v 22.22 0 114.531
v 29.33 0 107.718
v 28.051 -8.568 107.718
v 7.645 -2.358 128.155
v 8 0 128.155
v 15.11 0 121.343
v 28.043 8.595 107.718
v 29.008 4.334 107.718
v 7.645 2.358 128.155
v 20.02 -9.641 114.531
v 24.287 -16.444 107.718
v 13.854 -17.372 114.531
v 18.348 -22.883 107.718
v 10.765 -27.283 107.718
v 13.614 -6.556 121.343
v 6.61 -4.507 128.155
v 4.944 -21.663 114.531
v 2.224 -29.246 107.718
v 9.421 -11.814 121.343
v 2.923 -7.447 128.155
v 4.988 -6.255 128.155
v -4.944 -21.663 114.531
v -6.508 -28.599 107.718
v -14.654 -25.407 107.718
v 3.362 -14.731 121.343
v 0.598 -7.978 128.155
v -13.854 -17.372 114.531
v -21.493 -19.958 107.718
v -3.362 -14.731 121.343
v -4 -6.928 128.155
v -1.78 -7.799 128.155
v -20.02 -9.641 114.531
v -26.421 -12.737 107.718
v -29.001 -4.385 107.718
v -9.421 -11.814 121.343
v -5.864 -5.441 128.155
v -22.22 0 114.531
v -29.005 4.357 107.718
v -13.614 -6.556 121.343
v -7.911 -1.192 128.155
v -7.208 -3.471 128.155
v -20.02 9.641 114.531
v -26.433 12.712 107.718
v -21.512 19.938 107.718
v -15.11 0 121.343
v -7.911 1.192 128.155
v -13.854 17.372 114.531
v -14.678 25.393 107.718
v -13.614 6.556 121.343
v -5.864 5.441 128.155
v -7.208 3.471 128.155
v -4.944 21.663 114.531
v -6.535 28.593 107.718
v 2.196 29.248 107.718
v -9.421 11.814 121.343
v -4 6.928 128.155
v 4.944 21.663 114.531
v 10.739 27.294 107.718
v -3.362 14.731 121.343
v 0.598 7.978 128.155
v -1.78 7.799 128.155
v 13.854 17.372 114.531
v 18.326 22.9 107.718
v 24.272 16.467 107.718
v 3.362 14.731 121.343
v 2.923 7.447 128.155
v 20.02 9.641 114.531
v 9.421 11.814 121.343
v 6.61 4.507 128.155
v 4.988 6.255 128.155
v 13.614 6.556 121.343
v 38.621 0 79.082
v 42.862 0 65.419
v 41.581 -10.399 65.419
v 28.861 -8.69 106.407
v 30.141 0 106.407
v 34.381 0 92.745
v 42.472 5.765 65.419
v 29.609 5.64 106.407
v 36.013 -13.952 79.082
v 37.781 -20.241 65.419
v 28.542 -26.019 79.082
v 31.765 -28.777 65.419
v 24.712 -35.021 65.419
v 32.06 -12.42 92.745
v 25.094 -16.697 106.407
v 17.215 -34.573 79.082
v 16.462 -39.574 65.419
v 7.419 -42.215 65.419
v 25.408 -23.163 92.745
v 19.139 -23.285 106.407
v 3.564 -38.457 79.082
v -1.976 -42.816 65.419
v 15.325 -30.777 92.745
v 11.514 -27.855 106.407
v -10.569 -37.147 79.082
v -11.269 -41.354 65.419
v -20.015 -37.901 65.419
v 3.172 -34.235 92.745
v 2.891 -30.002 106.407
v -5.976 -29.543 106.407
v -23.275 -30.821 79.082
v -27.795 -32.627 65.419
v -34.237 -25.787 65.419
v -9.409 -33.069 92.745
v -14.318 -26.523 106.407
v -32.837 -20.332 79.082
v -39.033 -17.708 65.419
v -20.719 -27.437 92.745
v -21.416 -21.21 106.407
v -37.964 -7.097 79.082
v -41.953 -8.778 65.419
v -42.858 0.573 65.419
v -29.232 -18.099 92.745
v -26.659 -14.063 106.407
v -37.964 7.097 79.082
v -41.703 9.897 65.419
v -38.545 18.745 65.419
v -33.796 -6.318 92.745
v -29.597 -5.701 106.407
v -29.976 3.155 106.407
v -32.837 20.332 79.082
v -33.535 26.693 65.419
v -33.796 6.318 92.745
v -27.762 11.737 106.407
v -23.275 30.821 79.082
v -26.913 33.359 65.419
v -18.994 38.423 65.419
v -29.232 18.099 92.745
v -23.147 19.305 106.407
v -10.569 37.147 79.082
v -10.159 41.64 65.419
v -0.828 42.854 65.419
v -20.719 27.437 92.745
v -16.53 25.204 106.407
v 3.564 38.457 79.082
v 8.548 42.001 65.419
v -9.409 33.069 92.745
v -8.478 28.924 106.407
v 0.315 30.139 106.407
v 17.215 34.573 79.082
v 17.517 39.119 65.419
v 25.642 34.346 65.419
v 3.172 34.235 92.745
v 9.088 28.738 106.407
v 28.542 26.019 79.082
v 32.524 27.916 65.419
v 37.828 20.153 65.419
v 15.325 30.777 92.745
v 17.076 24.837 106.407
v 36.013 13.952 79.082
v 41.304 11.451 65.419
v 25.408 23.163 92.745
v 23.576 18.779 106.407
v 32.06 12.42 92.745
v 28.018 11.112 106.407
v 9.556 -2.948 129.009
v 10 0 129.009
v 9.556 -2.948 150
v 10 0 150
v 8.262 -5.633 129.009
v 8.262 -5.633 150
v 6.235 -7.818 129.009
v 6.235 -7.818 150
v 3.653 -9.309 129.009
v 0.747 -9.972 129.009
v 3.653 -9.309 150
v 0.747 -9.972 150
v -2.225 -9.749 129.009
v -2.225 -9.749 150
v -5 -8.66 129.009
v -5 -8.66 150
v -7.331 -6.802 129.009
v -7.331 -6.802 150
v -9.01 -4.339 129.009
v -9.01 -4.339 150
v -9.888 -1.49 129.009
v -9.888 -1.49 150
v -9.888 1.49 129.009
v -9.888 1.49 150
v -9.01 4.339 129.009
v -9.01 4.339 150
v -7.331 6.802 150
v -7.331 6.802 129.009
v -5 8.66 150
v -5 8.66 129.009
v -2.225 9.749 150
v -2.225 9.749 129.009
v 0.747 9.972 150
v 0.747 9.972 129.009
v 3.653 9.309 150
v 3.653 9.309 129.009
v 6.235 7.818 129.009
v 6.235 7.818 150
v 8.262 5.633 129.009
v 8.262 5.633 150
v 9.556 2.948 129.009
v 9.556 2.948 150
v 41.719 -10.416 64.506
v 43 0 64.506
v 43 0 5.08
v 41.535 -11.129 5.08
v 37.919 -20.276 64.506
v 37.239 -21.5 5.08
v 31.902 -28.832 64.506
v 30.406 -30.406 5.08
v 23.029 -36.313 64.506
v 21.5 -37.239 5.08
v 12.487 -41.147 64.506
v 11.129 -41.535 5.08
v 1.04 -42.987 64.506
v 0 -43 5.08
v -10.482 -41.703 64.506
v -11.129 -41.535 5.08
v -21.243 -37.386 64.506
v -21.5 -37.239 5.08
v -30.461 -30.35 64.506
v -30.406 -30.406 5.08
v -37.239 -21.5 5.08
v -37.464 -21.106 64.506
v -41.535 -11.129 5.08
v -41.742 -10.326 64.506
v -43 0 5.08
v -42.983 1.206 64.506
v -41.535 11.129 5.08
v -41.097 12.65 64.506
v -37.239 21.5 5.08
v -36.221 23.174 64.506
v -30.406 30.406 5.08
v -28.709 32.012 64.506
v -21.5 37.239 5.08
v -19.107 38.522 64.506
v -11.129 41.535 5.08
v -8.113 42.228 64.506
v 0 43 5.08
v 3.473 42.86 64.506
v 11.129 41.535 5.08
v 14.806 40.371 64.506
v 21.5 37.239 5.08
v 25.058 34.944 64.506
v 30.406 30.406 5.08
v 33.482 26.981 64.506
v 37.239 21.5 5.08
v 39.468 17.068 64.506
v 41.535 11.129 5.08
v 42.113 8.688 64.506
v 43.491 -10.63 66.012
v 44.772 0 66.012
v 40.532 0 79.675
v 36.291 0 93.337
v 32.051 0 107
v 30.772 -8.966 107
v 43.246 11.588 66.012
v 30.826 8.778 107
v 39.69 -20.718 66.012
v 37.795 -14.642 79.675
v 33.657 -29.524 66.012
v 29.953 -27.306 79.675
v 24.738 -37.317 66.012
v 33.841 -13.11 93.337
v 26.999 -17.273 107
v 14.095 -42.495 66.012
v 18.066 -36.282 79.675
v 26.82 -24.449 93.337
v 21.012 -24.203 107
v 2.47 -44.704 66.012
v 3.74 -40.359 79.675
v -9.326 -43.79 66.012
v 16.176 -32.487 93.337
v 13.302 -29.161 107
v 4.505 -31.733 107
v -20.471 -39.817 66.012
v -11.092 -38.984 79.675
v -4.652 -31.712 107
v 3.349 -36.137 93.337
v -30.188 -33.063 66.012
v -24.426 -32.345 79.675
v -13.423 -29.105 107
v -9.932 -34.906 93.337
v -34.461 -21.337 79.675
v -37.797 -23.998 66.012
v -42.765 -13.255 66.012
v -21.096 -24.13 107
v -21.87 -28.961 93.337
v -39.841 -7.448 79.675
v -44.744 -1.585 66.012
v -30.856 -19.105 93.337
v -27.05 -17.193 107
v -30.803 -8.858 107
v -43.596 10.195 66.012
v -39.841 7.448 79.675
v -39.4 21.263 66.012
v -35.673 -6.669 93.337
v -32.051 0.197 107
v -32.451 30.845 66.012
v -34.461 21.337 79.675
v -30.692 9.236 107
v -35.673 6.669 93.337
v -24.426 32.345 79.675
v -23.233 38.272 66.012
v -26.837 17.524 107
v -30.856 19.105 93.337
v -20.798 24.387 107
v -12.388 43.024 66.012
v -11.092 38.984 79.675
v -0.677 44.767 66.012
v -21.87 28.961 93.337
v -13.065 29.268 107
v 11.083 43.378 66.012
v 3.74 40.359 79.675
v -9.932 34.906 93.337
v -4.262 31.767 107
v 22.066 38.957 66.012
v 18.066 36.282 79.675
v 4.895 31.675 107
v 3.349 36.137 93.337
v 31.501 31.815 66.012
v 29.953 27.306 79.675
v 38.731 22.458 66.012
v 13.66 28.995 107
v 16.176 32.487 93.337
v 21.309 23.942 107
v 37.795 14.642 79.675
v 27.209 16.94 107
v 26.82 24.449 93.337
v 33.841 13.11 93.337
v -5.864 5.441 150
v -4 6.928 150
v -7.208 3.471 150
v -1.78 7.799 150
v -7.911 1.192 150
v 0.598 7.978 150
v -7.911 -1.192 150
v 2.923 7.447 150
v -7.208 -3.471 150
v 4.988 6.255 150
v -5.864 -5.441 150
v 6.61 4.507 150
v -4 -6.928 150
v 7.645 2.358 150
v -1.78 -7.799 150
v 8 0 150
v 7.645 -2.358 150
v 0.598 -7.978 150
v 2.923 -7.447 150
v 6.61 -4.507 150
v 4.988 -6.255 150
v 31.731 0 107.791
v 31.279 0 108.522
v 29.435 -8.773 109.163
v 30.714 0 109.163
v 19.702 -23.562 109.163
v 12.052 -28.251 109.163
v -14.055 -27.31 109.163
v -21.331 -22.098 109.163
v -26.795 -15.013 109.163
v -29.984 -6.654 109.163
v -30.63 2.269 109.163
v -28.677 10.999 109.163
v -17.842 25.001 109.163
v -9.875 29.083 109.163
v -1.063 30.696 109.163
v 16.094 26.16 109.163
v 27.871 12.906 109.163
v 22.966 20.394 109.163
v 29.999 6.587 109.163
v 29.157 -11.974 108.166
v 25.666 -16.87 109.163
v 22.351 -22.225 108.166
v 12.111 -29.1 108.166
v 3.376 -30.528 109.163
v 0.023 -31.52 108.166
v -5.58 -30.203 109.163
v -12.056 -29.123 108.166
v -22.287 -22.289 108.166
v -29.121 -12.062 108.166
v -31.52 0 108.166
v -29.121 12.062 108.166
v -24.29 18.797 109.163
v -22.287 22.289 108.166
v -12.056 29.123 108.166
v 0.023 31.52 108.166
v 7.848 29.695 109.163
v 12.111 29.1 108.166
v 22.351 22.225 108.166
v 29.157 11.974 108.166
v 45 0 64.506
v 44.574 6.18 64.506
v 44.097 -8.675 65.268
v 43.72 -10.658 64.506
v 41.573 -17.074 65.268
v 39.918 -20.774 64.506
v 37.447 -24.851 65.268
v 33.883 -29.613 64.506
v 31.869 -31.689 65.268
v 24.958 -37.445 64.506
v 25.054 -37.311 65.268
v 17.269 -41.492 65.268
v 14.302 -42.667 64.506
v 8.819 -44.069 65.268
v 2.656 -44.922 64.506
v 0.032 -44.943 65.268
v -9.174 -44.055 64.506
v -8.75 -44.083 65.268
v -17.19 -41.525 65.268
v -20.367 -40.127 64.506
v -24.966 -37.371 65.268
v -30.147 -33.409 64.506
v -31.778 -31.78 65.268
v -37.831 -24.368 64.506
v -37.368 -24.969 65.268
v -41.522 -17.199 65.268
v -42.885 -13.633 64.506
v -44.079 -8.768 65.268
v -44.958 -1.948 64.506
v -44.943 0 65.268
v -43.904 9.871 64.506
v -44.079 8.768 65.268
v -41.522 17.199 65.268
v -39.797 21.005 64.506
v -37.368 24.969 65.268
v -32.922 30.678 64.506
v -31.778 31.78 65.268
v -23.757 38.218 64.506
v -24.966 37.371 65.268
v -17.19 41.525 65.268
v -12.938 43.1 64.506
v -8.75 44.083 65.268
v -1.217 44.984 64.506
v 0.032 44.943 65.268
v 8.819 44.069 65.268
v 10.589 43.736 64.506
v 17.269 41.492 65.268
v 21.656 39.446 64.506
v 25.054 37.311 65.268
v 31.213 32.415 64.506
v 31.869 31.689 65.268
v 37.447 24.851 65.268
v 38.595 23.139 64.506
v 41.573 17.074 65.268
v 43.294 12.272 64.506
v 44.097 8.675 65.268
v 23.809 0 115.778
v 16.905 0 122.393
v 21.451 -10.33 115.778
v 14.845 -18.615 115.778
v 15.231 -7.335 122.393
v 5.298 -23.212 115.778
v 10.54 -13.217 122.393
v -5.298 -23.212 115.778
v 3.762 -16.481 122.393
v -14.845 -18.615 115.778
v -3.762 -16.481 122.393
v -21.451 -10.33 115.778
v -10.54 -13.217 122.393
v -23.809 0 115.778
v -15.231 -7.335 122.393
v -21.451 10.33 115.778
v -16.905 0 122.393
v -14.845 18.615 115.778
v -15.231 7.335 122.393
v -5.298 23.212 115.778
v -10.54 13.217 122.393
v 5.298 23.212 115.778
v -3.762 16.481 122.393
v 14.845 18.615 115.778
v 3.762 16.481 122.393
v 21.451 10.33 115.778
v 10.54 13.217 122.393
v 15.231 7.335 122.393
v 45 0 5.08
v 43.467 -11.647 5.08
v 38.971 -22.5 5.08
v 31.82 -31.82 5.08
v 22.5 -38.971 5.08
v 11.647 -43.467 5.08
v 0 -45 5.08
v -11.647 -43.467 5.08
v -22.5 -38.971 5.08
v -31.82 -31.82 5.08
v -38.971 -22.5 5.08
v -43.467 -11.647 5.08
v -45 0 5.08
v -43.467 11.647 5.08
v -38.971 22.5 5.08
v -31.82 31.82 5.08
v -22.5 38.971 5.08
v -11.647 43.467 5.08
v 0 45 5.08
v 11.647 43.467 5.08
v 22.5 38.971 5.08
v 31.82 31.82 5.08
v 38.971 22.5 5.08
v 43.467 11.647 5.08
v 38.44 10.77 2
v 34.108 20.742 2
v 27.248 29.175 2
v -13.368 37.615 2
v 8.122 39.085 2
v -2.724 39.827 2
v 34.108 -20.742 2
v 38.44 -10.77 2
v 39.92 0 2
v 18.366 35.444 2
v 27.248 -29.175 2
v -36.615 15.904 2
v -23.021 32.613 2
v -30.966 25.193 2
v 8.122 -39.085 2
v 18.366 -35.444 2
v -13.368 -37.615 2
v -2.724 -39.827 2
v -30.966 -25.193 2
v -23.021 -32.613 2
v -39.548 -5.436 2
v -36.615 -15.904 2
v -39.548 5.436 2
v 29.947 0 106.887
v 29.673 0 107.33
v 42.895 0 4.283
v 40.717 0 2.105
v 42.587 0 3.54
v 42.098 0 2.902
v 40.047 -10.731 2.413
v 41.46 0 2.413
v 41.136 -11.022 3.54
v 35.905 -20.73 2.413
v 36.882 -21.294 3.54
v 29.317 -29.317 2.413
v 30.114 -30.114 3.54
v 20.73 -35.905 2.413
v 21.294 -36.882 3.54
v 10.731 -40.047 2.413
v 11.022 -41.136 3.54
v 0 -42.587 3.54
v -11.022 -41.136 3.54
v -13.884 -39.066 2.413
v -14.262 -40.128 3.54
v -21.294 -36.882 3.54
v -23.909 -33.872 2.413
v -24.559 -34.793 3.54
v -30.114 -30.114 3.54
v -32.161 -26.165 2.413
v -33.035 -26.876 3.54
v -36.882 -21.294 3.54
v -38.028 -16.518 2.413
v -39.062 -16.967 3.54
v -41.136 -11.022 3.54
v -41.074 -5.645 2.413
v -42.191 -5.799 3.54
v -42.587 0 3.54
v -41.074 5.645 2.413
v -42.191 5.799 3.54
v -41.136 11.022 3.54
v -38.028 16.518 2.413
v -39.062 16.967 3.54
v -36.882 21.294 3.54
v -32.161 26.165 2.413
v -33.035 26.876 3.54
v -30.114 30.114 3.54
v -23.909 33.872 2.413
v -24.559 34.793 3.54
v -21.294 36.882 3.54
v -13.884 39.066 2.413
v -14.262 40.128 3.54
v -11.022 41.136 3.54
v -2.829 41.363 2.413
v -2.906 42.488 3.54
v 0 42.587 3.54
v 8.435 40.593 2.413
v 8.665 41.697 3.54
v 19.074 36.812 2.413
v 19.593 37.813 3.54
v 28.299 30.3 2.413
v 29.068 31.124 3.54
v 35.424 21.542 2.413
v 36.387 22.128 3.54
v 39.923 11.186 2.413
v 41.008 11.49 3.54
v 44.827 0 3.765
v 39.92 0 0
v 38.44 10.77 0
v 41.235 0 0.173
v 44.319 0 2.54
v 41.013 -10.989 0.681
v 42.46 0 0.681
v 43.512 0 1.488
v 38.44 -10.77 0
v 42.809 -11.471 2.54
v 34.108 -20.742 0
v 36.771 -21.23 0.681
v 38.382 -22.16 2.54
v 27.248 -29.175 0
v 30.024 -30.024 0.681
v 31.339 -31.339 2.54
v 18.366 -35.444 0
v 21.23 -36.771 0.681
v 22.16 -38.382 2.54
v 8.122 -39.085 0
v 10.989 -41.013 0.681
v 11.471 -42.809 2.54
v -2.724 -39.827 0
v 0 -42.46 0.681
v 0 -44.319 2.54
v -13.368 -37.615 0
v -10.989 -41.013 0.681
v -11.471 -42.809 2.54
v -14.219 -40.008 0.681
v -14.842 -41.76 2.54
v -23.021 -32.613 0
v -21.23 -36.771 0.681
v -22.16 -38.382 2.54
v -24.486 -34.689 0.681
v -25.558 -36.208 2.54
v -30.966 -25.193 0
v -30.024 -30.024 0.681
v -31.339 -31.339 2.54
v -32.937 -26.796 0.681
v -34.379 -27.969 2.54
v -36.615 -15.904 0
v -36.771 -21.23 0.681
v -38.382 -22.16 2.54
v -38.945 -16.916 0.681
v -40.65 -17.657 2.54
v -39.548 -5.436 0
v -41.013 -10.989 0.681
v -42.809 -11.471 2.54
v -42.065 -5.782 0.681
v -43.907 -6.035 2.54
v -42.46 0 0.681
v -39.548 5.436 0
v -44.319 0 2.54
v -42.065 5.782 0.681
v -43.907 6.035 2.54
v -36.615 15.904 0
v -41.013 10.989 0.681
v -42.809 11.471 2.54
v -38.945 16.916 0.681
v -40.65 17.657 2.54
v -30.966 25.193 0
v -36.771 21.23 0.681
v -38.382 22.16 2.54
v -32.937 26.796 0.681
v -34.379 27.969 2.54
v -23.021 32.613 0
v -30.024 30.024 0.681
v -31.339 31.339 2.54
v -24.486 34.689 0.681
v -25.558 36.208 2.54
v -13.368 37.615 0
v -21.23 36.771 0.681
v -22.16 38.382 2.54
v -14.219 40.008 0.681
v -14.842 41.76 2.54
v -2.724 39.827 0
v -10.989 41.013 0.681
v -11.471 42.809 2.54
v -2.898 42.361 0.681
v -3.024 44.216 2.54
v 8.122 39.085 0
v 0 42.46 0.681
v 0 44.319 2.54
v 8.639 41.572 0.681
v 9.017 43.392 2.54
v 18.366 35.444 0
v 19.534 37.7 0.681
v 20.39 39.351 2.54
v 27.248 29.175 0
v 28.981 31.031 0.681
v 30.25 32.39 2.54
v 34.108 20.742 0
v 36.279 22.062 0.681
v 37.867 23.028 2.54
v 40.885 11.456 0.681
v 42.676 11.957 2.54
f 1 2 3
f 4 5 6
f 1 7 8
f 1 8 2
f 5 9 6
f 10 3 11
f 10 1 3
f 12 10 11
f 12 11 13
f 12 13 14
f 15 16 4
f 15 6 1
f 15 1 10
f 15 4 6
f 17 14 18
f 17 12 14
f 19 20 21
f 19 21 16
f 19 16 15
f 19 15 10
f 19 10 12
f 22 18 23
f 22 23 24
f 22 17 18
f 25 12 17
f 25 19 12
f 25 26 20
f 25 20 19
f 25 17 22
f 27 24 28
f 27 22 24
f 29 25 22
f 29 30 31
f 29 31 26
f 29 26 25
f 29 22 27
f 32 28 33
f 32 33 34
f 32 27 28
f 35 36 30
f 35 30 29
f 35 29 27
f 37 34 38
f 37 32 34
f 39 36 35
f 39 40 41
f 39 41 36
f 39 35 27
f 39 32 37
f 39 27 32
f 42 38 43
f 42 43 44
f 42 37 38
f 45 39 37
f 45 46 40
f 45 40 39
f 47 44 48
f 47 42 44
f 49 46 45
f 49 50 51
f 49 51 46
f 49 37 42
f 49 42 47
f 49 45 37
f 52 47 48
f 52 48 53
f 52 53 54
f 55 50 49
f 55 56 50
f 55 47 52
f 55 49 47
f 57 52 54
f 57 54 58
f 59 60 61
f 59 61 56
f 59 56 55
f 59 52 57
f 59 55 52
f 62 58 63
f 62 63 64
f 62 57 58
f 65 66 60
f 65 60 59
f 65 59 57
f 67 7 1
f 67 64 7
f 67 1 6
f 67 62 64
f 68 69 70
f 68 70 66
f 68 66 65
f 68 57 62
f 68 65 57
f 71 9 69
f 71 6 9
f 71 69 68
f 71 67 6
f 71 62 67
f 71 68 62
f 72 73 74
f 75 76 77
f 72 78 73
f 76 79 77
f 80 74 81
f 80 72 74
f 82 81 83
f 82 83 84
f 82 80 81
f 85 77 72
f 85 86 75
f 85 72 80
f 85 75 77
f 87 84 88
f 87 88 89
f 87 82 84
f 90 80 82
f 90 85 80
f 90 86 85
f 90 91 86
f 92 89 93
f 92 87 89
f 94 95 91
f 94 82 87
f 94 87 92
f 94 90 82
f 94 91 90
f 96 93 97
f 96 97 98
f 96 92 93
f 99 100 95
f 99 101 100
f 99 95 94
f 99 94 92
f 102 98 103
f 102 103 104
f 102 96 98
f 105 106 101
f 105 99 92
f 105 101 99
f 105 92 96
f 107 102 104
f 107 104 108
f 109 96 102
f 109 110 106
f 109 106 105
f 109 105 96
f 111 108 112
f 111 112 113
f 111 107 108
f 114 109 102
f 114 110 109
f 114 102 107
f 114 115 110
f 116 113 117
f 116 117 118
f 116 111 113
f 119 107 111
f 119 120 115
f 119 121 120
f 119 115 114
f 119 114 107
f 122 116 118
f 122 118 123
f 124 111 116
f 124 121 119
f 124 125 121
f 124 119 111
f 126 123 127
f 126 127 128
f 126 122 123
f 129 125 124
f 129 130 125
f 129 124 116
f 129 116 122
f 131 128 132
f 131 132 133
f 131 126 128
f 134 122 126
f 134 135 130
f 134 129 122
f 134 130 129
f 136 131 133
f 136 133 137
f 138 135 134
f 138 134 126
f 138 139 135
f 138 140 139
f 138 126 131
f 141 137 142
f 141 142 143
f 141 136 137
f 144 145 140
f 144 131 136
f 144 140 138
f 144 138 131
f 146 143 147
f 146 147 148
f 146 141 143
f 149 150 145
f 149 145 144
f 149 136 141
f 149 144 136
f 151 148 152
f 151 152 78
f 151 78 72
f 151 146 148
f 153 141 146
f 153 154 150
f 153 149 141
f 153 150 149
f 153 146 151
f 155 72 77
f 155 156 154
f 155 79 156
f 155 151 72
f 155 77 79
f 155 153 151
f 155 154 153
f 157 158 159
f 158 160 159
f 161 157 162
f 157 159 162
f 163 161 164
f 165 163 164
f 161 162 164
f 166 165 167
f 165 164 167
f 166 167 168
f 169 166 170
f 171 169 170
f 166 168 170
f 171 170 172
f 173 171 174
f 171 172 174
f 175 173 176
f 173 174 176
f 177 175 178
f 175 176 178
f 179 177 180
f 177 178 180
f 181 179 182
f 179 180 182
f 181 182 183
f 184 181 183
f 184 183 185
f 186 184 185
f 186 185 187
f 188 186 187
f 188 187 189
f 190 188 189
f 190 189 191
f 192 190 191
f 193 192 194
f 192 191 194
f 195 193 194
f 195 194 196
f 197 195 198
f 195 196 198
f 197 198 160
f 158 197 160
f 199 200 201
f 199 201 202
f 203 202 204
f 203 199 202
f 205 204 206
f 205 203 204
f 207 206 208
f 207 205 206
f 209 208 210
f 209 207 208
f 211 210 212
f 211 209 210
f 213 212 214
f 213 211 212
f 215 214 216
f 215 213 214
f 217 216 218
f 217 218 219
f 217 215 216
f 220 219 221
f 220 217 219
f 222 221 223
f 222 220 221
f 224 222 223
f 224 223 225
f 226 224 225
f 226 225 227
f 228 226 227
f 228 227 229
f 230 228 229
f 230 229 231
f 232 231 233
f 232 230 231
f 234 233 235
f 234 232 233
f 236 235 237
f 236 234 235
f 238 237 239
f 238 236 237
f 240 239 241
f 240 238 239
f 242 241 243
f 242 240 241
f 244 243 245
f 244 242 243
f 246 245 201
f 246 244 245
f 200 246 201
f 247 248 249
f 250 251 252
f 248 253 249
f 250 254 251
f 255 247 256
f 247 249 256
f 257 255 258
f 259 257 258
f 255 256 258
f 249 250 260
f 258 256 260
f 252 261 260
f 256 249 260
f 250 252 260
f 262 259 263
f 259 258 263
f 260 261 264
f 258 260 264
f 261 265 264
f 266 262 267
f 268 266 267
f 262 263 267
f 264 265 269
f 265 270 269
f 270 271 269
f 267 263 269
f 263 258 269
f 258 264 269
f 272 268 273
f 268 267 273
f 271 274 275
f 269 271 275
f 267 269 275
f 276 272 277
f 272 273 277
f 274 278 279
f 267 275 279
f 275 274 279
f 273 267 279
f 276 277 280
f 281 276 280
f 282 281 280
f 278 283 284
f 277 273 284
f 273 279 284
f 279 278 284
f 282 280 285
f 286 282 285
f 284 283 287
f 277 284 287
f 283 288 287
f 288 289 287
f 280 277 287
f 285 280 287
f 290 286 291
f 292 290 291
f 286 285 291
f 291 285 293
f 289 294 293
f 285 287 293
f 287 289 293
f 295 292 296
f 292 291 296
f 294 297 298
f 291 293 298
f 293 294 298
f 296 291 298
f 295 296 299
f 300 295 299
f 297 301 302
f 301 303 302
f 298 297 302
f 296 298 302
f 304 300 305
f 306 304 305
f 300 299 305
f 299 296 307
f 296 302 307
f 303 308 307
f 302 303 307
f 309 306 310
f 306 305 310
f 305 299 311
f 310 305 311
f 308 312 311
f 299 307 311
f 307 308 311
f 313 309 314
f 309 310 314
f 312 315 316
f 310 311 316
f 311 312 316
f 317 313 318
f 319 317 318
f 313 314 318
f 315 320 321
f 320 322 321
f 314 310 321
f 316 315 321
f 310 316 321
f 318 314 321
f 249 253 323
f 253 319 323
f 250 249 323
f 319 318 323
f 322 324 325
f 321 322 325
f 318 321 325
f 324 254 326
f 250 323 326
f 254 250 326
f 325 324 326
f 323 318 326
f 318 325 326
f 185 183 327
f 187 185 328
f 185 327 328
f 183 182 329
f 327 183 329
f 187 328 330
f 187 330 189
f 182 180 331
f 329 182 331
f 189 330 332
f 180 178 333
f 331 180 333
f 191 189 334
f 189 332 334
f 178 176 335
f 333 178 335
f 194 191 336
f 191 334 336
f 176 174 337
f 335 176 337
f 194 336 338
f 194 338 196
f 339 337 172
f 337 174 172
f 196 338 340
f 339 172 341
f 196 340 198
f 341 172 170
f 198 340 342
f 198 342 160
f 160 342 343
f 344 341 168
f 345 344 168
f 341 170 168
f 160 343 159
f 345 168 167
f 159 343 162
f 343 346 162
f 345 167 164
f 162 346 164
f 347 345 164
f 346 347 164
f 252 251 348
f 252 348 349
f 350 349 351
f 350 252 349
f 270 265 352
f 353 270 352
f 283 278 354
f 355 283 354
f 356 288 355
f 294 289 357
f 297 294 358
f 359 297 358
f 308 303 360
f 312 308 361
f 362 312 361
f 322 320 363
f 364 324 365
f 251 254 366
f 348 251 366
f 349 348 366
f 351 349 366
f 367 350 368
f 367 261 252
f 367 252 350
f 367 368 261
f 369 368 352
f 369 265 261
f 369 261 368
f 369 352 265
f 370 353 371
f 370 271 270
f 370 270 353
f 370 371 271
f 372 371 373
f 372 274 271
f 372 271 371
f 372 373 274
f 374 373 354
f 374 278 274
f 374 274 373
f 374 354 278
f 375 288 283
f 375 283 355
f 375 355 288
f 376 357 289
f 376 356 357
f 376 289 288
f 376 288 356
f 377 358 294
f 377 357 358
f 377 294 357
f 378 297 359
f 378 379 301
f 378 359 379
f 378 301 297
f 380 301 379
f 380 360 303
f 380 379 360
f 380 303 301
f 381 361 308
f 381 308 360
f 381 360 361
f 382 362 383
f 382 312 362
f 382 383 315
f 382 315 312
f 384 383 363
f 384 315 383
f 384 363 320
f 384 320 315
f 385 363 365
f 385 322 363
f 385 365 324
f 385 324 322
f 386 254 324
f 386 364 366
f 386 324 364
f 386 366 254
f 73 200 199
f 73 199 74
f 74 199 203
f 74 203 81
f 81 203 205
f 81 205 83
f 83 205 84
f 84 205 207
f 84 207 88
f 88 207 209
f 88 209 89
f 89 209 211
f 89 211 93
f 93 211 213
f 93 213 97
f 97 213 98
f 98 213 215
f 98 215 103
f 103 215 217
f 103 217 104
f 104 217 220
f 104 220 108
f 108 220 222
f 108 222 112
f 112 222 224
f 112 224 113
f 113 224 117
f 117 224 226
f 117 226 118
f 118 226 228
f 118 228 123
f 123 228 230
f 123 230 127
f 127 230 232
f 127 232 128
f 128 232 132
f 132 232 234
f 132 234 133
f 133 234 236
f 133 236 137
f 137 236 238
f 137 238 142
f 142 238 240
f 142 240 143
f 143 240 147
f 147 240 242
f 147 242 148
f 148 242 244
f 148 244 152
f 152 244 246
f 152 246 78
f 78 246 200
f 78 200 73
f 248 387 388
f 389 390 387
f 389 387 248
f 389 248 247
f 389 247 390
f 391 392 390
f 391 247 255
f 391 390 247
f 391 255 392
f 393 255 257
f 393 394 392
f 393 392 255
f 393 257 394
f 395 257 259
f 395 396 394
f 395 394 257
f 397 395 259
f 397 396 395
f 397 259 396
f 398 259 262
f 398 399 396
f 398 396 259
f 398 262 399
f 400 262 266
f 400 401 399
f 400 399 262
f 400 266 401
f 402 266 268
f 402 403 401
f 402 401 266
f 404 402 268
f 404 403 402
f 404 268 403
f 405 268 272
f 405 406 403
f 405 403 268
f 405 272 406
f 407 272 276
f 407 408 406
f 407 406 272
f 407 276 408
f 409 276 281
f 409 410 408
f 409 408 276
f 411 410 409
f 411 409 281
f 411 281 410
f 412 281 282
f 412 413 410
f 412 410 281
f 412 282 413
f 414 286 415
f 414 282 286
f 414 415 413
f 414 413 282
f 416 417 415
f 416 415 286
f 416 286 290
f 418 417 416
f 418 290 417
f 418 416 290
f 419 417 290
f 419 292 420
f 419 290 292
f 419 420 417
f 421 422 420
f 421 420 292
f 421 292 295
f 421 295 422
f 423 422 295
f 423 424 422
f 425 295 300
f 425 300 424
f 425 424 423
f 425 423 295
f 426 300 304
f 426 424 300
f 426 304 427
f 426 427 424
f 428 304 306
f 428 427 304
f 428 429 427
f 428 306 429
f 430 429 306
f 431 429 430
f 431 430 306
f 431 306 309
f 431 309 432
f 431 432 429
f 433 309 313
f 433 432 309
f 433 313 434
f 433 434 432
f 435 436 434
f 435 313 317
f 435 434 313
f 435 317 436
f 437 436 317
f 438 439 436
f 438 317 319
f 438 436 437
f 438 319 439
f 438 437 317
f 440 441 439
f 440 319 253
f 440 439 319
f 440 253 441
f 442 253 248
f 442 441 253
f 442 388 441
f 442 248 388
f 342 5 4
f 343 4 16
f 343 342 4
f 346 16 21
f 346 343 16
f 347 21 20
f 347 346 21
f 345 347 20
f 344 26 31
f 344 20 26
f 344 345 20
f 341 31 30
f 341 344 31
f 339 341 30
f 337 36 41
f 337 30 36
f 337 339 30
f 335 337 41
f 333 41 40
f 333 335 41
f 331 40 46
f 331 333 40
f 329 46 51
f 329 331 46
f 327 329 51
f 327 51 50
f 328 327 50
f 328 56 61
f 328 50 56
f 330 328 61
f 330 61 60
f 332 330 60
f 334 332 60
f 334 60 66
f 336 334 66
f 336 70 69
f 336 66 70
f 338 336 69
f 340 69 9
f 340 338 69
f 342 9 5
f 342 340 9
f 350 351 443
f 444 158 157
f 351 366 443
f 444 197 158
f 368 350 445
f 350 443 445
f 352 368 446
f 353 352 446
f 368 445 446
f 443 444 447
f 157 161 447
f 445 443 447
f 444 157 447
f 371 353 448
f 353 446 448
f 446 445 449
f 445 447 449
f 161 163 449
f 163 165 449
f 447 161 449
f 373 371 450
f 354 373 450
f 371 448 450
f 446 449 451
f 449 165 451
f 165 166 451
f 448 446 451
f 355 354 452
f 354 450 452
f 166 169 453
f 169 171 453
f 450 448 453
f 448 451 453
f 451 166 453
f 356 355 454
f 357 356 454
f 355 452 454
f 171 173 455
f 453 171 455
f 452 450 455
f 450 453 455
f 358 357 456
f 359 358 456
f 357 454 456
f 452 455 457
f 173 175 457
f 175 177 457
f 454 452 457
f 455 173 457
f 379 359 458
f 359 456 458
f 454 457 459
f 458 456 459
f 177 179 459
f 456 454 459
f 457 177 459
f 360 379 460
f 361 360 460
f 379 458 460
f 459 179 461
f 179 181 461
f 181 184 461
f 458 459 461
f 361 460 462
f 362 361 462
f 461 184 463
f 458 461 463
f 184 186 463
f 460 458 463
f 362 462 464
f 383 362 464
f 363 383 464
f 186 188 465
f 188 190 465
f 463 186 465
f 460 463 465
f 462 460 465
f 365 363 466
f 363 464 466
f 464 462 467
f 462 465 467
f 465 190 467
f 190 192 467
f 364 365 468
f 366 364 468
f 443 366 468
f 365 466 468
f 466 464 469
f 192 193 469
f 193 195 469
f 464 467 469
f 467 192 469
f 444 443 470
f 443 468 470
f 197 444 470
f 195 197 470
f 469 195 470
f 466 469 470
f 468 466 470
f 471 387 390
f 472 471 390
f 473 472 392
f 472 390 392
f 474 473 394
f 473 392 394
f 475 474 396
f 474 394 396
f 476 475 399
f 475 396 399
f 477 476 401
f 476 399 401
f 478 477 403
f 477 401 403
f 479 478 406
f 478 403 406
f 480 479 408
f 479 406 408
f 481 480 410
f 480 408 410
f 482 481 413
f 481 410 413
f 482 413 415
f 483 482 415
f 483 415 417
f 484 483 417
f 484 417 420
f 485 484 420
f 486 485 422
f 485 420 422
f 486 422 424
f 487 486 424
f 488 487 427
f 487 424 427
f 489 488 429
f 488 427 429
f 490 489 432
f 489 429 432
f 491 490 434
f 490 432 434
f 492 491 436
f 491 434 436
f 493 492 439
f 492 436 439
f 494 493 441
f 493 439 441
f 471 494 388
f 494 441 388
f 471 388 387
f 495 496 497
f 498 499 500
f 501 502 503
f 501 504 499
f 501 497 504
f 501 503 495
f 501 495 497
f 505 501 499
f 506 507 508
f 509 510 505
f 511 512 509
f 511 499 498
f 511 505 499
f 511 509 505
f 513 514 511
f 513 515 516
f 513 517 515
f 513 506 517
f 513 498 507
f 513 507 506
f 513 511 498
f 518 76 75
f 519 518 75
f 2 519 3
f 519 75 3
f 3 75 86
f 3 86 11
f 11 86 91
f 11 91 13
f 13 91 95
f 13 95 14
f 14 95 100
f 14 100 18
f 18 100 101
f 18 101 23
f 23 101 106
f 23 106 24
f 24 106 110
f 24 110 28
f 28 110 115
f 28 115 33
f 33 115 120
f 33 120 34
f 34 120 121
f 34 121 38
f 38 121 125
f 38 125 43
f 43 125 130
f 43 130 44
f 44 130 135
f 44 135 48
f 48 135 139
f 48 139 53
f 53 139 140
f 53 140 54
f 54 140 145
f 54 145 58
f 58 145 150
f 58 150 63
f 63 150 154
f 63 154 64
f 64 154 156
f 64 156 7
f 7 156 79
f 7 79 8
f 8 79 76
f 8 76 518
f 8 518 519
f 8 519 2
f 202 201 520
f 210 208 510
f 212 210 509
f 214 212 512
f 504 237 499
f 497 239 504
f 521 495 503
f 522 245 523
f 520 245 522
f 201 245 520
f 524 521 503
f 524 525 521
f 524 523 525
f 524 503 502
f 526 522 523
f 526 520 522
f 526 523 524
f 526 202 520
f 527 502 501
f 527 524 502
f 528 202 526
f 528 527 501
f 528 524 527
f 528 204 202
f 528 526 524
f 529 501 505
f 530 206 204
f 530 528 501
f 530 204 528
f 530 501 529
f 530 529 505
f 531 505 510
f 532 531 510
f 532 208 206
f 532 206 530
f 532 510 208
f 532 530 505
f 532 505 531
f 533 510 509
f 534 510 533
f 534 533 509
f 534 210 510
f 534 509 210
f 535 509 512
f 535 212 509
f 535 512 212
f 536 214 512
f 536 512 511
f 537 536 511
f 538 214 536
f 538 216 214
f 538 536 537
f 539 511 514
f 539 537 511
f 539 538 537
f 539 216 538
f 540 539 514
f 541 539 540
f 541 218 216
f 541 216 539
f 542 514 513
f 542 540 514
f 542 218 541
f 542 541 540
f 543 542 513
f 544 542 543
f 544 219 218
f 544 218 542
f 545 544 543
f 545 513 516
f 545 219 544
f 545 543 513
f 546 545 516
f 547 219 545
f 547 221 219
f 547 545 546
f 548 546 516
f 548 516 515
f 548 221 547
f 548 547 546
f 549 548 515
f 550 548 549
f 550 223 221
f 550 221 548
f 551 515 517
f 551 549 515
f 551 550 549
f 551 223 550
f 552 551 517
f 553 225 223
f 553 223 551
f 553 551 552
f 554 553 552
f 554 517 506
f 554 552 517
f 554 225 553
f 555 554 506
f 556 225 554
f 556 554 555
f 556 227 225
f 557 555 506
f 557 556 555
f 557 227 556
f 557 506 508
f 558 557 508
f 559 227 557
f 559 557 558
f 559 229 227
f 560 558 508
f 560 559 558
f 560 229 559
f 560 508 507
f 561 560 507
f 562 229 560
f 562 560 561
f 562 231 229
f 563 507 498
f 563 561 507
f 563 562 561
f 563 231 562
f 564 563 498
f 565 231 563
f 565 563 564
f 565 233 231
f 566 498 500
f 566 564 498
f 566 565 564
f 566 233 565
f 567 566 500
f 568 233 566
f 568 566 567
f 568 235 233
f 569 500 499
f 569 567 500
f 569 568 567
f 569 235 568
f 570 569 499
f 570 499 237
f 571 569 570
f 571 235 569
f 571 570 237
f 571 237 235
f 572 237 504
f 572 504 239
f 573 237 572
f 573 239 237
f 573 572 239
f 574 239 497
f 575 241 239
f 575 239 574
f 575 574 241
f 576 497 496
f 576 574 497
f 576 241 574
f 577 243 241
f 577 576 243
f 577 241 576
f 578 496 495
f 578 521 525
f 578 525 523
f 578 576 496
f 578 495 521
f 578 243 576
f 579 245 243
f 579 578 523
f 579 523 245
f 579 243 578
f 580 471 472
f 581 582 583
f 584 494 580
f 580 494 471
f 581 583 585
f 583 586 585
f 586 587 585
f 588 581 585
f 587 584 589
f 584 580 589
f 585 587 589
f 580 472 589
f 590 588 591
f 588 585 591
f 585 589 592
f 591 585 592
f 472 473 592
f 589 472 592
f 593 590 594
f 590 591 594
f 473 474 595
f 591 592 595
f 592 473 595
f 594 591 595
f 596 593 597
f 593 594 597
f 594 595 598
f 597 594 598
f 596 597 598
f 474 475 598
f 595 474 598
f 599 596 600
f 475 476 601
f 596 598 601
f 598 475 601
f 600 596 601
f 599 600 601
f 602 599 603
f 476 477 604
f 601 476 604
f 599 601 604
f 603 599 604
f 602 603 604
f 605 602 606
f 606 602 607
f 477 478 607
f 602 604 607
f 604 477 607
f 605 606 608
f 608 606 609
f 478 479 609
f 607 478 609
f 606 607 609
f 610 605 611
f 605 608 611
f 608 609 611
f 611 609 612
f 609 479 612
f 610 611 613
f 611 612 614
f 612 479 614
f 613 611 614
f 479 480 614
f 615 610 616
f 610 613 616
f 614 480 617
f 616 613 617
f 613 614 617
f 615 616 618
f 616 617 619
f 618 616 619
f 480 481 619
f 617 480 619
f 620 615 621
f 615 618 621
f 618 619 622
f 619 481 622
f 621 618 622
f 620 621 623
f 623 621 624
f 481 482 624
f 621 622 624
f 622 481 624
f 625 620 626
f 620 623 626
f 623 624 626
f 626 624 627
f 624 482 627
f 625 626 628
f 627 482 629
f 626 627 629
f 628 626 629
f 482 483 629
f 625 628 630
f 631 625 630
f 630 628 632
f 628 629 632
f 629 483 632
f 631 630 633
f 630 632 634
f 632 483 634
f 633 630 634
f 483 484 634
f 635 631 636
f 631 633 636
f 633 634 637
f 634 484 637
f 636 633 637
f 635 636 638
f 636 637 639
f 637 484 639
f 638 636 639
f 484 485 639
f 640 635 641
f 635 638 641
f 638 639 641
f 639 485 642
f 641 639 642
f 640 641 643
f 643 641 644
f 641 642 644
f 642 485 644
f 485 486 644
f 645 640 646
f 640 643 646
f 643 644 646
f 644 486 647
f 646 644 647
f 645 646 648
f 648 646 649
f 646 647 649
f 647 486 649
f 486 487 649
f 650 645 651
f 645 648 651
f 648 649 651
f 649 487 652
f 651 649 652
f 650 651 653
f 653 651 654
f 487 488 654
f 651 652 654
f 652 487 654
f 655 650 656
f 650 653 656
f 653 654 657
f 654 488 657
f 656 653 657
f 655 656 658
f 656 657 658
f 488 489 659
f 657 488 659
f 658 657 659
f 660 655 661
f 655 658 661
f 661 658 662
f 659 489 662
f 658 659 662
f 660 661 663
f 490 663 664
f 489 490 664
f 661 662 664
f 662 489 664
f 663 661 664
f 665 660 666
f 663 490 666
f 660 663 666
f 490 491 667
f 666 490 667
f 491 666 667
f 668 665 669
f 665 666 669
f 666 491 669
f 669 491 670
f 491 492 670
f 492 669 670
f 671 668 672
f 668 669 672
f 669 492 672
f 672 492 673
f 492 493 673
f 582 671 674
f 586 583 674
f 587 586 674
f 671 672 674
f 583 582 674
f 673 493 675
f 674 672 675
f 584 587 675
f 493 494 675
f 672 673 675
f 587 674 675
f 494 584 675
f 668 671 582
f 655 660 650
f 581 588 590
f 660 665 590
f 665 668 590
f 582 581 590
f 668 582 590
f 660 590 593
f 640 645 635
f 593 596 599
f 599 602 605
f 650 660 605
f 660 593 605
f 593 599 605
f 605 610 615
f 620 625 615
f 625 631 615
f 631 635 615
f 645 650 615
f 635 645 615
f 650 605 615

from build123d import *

# Parameters (mm, degrees)
F2_R = 5.08
F3_R = 5.08
F4_T = -2


with BuildPart() as f1:
    # F0 (on Front) → F1 (revolve)
    with BuildSketch(Plane.XZ):
        Polygon((0, 150), (0, 0), (45, 0), (45, 65.276236894), (31.6620995219, 108.2541429718), (10, 129.0087435294), (10, 150), align=None)
    revolve(axis=Axis((0, 0, 75), (0, 0, -1)))

    # F2
    f2_edges = [f1.edges().sort_by_distance(p)[0] for p in [
        (-45, 0, 0),
        (-45, 0, 65.276237),
        (45, 0, 32.638118),
    ]]
    fillet(f2_edges, radius=F2_R)

    # F3
    f3_edges = [f1.edges().sort_by_distance(p)[0] for p in [
        (-31.6621, 0, 108.254143),
    ]]
    fillet(f3_edges, radius=F3_R)

    # F4
    f4_openings = [f1.faces().sort_by_distance(p)[0] for p in [
        (0, 0, 150),
    ]]
    offset(amount=F4_T, openings=f4_openings, kind=Kind.INTERSECTION)


solid = f1.part
